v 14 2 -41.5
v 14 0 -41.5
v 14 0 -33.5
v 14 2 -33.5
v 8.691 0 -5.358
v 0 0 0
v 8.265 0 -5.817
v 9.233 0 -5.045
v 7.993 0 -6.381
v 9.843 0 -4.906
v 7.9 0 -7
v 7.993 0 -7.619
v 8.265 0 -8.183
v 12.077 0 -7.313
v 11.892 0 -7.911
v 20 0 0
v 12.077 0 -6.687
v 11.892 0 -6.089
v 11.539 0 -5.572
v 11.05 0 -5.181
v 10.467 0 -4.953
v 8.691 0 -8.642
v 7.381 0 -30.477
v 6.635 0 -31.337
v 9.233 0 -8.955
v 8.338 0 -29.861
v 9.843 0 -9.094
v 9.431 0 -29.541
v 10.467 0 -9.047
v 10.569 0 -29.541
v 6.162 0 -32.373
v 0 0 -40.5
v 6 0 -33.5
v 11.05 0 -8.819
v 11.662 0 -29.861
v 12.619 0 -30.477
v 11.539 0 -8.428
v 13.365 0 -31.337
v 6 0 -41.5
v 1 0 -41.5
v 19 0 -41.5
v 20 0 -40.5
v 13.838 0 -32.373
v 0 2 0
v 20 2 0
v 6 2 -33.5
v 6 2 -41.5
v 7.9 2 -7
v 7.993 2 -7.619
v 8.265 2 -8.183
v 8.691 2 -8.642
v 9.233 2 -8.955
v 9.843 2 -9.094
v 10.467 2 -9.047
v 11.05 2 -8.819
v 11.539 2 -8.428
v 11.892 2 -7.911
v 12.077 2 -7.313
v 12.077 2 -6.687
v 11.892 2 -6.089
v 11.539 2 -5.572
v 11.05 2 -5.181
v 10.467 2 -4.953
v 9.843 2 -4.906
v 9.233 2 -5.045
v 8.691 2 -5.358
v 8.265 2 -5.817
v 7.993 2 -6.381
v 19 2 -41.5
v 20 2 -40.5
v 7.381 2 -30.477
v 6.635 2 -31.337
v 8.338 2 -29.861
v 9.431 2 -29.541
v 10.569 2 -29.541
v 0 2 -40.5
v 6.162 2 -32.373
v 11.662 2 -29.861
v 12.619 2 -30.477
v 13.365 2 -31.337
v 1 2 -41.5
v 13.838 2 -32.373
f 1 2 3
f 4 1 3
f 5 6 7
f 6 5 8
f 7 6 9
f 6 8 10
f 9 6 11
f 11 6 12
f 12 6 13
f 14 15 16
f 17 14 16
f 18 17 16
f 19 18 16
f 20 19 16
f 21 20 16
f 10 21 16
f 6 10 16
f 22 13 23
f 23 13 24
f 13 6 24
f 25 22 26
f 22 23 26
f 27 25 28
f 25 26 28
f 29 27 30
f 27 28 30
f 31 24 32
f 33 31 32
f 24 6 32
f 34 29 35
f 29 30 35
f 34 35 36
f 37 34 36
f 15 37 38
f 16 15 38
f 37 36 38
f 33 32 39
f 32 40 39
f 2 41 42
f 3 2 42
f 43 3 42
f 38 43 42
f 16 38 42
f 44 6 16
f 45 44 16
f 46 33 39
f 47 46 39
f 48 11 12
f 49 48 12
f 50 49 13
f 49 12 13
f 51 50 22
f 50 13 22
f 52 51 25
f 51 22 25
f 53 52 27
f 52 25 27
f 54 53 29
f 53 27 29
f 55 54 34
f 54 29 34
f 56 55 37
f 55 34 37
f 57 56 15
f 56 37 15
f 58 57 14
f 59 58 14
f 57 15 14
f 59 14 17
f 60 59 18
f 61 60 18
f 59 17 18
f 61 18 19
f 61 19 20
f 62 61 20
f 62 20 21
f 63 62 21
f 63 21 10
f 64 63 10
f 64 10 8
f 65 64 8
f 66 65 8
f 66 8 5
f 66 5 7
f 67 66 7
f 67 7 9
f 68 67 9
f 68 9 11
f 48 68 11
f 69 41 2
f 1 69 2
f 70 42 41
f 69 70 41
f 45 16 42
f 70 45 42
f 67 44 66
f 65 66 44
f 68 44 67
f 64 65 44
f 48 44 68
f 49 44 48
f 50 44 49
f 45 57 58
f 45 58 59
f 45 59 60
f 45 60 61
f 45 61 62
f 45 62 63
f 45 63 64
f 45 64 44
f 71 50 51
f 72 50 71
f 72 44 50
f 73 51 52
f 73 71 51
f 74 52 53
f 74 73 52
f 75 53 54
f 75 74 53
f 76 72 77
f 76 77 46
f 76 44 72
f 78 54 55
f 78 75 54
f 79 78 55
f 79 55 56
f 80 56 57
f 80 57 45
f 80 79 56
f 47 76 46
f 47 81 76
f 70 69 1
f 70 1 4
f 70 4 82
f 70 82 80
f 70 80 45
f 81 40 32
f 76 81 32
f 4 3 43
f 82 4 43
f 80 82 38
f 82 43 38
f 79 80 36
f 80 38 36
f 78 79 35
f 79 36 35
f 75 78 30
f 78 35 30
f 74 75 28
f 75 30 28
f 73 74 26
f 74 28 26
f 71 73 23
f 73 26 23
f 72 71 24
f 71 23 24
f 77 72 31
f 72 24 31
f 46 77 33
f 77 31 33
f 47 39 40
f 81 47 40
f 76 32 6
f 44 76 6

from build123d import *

# Parameters (mm, degrees)
SKETCH_1_R            = 1
EXTRUDE_1_DEPTH       = 2
HOLE_WIZARD_M51_D     = 4.2
HOLE_WIZARD_M51_DEPTH = 14
HOLE_WIZARD_M51_TIP   = 1.2618073


with BuildPart() as part:
    # Эскиз1 → Бобышка-Вытянуть1 (new body)
    with BuildSketch(Plane(origin=(0, 0, 0), x_dir=(1, 0, 0), z_dir=(0, 1, 0))):
        with BuildLine():
            Line((0, 0), (20, 0))
            Line((20, 0), (20, 40.5))
            Line((20, 40.5), (19, 41.5))
            Line((19, 41.5), (14, 41.5))
            Line((14, 41.5), (14, 33.5))
            ThreePointArc((14, 33.5), (10, 29.5), (6, 33.5))
            Line((6, 33.5), (6, 41.5))
            Line((6, 41.5), (1, 41.5))
            Line((1, 41.5), (0, 40.5))
            Line((0, 40.5), (0, 0))
        make_face()
        with Locations(Location((10, 7, 0), (0, 0, 270))):
            Circle(SKETCH_1_R, mode=Mode.SUBTRACT)
    extrude(amount=EXTRUDE_1_DEPTH)

    # Отверстие обработанное метчиком M51
    with Locations(Plane(origin=(0, 2, 0), x_dir=(1, 0, 0), z_dir=(0, 1, 0))):
        with Locations((10, 7)):
            Hole(HOLE_WIZARD_M51_D / 2, depth=HOLE_WIZARD_M51_DEPTH)
            with Locations((0, 0, -(HOLE_WIZARD_M51_DEPTH + HOLE_WIZARD_M51_TIP / 2))):  # 118° drill point
                Cone(0, HOLE_WIZARD_M51_D / 2, HOLE_WIZARD_M51_TIP, mode=Mode.SUBTRACT)


solid = part.part
